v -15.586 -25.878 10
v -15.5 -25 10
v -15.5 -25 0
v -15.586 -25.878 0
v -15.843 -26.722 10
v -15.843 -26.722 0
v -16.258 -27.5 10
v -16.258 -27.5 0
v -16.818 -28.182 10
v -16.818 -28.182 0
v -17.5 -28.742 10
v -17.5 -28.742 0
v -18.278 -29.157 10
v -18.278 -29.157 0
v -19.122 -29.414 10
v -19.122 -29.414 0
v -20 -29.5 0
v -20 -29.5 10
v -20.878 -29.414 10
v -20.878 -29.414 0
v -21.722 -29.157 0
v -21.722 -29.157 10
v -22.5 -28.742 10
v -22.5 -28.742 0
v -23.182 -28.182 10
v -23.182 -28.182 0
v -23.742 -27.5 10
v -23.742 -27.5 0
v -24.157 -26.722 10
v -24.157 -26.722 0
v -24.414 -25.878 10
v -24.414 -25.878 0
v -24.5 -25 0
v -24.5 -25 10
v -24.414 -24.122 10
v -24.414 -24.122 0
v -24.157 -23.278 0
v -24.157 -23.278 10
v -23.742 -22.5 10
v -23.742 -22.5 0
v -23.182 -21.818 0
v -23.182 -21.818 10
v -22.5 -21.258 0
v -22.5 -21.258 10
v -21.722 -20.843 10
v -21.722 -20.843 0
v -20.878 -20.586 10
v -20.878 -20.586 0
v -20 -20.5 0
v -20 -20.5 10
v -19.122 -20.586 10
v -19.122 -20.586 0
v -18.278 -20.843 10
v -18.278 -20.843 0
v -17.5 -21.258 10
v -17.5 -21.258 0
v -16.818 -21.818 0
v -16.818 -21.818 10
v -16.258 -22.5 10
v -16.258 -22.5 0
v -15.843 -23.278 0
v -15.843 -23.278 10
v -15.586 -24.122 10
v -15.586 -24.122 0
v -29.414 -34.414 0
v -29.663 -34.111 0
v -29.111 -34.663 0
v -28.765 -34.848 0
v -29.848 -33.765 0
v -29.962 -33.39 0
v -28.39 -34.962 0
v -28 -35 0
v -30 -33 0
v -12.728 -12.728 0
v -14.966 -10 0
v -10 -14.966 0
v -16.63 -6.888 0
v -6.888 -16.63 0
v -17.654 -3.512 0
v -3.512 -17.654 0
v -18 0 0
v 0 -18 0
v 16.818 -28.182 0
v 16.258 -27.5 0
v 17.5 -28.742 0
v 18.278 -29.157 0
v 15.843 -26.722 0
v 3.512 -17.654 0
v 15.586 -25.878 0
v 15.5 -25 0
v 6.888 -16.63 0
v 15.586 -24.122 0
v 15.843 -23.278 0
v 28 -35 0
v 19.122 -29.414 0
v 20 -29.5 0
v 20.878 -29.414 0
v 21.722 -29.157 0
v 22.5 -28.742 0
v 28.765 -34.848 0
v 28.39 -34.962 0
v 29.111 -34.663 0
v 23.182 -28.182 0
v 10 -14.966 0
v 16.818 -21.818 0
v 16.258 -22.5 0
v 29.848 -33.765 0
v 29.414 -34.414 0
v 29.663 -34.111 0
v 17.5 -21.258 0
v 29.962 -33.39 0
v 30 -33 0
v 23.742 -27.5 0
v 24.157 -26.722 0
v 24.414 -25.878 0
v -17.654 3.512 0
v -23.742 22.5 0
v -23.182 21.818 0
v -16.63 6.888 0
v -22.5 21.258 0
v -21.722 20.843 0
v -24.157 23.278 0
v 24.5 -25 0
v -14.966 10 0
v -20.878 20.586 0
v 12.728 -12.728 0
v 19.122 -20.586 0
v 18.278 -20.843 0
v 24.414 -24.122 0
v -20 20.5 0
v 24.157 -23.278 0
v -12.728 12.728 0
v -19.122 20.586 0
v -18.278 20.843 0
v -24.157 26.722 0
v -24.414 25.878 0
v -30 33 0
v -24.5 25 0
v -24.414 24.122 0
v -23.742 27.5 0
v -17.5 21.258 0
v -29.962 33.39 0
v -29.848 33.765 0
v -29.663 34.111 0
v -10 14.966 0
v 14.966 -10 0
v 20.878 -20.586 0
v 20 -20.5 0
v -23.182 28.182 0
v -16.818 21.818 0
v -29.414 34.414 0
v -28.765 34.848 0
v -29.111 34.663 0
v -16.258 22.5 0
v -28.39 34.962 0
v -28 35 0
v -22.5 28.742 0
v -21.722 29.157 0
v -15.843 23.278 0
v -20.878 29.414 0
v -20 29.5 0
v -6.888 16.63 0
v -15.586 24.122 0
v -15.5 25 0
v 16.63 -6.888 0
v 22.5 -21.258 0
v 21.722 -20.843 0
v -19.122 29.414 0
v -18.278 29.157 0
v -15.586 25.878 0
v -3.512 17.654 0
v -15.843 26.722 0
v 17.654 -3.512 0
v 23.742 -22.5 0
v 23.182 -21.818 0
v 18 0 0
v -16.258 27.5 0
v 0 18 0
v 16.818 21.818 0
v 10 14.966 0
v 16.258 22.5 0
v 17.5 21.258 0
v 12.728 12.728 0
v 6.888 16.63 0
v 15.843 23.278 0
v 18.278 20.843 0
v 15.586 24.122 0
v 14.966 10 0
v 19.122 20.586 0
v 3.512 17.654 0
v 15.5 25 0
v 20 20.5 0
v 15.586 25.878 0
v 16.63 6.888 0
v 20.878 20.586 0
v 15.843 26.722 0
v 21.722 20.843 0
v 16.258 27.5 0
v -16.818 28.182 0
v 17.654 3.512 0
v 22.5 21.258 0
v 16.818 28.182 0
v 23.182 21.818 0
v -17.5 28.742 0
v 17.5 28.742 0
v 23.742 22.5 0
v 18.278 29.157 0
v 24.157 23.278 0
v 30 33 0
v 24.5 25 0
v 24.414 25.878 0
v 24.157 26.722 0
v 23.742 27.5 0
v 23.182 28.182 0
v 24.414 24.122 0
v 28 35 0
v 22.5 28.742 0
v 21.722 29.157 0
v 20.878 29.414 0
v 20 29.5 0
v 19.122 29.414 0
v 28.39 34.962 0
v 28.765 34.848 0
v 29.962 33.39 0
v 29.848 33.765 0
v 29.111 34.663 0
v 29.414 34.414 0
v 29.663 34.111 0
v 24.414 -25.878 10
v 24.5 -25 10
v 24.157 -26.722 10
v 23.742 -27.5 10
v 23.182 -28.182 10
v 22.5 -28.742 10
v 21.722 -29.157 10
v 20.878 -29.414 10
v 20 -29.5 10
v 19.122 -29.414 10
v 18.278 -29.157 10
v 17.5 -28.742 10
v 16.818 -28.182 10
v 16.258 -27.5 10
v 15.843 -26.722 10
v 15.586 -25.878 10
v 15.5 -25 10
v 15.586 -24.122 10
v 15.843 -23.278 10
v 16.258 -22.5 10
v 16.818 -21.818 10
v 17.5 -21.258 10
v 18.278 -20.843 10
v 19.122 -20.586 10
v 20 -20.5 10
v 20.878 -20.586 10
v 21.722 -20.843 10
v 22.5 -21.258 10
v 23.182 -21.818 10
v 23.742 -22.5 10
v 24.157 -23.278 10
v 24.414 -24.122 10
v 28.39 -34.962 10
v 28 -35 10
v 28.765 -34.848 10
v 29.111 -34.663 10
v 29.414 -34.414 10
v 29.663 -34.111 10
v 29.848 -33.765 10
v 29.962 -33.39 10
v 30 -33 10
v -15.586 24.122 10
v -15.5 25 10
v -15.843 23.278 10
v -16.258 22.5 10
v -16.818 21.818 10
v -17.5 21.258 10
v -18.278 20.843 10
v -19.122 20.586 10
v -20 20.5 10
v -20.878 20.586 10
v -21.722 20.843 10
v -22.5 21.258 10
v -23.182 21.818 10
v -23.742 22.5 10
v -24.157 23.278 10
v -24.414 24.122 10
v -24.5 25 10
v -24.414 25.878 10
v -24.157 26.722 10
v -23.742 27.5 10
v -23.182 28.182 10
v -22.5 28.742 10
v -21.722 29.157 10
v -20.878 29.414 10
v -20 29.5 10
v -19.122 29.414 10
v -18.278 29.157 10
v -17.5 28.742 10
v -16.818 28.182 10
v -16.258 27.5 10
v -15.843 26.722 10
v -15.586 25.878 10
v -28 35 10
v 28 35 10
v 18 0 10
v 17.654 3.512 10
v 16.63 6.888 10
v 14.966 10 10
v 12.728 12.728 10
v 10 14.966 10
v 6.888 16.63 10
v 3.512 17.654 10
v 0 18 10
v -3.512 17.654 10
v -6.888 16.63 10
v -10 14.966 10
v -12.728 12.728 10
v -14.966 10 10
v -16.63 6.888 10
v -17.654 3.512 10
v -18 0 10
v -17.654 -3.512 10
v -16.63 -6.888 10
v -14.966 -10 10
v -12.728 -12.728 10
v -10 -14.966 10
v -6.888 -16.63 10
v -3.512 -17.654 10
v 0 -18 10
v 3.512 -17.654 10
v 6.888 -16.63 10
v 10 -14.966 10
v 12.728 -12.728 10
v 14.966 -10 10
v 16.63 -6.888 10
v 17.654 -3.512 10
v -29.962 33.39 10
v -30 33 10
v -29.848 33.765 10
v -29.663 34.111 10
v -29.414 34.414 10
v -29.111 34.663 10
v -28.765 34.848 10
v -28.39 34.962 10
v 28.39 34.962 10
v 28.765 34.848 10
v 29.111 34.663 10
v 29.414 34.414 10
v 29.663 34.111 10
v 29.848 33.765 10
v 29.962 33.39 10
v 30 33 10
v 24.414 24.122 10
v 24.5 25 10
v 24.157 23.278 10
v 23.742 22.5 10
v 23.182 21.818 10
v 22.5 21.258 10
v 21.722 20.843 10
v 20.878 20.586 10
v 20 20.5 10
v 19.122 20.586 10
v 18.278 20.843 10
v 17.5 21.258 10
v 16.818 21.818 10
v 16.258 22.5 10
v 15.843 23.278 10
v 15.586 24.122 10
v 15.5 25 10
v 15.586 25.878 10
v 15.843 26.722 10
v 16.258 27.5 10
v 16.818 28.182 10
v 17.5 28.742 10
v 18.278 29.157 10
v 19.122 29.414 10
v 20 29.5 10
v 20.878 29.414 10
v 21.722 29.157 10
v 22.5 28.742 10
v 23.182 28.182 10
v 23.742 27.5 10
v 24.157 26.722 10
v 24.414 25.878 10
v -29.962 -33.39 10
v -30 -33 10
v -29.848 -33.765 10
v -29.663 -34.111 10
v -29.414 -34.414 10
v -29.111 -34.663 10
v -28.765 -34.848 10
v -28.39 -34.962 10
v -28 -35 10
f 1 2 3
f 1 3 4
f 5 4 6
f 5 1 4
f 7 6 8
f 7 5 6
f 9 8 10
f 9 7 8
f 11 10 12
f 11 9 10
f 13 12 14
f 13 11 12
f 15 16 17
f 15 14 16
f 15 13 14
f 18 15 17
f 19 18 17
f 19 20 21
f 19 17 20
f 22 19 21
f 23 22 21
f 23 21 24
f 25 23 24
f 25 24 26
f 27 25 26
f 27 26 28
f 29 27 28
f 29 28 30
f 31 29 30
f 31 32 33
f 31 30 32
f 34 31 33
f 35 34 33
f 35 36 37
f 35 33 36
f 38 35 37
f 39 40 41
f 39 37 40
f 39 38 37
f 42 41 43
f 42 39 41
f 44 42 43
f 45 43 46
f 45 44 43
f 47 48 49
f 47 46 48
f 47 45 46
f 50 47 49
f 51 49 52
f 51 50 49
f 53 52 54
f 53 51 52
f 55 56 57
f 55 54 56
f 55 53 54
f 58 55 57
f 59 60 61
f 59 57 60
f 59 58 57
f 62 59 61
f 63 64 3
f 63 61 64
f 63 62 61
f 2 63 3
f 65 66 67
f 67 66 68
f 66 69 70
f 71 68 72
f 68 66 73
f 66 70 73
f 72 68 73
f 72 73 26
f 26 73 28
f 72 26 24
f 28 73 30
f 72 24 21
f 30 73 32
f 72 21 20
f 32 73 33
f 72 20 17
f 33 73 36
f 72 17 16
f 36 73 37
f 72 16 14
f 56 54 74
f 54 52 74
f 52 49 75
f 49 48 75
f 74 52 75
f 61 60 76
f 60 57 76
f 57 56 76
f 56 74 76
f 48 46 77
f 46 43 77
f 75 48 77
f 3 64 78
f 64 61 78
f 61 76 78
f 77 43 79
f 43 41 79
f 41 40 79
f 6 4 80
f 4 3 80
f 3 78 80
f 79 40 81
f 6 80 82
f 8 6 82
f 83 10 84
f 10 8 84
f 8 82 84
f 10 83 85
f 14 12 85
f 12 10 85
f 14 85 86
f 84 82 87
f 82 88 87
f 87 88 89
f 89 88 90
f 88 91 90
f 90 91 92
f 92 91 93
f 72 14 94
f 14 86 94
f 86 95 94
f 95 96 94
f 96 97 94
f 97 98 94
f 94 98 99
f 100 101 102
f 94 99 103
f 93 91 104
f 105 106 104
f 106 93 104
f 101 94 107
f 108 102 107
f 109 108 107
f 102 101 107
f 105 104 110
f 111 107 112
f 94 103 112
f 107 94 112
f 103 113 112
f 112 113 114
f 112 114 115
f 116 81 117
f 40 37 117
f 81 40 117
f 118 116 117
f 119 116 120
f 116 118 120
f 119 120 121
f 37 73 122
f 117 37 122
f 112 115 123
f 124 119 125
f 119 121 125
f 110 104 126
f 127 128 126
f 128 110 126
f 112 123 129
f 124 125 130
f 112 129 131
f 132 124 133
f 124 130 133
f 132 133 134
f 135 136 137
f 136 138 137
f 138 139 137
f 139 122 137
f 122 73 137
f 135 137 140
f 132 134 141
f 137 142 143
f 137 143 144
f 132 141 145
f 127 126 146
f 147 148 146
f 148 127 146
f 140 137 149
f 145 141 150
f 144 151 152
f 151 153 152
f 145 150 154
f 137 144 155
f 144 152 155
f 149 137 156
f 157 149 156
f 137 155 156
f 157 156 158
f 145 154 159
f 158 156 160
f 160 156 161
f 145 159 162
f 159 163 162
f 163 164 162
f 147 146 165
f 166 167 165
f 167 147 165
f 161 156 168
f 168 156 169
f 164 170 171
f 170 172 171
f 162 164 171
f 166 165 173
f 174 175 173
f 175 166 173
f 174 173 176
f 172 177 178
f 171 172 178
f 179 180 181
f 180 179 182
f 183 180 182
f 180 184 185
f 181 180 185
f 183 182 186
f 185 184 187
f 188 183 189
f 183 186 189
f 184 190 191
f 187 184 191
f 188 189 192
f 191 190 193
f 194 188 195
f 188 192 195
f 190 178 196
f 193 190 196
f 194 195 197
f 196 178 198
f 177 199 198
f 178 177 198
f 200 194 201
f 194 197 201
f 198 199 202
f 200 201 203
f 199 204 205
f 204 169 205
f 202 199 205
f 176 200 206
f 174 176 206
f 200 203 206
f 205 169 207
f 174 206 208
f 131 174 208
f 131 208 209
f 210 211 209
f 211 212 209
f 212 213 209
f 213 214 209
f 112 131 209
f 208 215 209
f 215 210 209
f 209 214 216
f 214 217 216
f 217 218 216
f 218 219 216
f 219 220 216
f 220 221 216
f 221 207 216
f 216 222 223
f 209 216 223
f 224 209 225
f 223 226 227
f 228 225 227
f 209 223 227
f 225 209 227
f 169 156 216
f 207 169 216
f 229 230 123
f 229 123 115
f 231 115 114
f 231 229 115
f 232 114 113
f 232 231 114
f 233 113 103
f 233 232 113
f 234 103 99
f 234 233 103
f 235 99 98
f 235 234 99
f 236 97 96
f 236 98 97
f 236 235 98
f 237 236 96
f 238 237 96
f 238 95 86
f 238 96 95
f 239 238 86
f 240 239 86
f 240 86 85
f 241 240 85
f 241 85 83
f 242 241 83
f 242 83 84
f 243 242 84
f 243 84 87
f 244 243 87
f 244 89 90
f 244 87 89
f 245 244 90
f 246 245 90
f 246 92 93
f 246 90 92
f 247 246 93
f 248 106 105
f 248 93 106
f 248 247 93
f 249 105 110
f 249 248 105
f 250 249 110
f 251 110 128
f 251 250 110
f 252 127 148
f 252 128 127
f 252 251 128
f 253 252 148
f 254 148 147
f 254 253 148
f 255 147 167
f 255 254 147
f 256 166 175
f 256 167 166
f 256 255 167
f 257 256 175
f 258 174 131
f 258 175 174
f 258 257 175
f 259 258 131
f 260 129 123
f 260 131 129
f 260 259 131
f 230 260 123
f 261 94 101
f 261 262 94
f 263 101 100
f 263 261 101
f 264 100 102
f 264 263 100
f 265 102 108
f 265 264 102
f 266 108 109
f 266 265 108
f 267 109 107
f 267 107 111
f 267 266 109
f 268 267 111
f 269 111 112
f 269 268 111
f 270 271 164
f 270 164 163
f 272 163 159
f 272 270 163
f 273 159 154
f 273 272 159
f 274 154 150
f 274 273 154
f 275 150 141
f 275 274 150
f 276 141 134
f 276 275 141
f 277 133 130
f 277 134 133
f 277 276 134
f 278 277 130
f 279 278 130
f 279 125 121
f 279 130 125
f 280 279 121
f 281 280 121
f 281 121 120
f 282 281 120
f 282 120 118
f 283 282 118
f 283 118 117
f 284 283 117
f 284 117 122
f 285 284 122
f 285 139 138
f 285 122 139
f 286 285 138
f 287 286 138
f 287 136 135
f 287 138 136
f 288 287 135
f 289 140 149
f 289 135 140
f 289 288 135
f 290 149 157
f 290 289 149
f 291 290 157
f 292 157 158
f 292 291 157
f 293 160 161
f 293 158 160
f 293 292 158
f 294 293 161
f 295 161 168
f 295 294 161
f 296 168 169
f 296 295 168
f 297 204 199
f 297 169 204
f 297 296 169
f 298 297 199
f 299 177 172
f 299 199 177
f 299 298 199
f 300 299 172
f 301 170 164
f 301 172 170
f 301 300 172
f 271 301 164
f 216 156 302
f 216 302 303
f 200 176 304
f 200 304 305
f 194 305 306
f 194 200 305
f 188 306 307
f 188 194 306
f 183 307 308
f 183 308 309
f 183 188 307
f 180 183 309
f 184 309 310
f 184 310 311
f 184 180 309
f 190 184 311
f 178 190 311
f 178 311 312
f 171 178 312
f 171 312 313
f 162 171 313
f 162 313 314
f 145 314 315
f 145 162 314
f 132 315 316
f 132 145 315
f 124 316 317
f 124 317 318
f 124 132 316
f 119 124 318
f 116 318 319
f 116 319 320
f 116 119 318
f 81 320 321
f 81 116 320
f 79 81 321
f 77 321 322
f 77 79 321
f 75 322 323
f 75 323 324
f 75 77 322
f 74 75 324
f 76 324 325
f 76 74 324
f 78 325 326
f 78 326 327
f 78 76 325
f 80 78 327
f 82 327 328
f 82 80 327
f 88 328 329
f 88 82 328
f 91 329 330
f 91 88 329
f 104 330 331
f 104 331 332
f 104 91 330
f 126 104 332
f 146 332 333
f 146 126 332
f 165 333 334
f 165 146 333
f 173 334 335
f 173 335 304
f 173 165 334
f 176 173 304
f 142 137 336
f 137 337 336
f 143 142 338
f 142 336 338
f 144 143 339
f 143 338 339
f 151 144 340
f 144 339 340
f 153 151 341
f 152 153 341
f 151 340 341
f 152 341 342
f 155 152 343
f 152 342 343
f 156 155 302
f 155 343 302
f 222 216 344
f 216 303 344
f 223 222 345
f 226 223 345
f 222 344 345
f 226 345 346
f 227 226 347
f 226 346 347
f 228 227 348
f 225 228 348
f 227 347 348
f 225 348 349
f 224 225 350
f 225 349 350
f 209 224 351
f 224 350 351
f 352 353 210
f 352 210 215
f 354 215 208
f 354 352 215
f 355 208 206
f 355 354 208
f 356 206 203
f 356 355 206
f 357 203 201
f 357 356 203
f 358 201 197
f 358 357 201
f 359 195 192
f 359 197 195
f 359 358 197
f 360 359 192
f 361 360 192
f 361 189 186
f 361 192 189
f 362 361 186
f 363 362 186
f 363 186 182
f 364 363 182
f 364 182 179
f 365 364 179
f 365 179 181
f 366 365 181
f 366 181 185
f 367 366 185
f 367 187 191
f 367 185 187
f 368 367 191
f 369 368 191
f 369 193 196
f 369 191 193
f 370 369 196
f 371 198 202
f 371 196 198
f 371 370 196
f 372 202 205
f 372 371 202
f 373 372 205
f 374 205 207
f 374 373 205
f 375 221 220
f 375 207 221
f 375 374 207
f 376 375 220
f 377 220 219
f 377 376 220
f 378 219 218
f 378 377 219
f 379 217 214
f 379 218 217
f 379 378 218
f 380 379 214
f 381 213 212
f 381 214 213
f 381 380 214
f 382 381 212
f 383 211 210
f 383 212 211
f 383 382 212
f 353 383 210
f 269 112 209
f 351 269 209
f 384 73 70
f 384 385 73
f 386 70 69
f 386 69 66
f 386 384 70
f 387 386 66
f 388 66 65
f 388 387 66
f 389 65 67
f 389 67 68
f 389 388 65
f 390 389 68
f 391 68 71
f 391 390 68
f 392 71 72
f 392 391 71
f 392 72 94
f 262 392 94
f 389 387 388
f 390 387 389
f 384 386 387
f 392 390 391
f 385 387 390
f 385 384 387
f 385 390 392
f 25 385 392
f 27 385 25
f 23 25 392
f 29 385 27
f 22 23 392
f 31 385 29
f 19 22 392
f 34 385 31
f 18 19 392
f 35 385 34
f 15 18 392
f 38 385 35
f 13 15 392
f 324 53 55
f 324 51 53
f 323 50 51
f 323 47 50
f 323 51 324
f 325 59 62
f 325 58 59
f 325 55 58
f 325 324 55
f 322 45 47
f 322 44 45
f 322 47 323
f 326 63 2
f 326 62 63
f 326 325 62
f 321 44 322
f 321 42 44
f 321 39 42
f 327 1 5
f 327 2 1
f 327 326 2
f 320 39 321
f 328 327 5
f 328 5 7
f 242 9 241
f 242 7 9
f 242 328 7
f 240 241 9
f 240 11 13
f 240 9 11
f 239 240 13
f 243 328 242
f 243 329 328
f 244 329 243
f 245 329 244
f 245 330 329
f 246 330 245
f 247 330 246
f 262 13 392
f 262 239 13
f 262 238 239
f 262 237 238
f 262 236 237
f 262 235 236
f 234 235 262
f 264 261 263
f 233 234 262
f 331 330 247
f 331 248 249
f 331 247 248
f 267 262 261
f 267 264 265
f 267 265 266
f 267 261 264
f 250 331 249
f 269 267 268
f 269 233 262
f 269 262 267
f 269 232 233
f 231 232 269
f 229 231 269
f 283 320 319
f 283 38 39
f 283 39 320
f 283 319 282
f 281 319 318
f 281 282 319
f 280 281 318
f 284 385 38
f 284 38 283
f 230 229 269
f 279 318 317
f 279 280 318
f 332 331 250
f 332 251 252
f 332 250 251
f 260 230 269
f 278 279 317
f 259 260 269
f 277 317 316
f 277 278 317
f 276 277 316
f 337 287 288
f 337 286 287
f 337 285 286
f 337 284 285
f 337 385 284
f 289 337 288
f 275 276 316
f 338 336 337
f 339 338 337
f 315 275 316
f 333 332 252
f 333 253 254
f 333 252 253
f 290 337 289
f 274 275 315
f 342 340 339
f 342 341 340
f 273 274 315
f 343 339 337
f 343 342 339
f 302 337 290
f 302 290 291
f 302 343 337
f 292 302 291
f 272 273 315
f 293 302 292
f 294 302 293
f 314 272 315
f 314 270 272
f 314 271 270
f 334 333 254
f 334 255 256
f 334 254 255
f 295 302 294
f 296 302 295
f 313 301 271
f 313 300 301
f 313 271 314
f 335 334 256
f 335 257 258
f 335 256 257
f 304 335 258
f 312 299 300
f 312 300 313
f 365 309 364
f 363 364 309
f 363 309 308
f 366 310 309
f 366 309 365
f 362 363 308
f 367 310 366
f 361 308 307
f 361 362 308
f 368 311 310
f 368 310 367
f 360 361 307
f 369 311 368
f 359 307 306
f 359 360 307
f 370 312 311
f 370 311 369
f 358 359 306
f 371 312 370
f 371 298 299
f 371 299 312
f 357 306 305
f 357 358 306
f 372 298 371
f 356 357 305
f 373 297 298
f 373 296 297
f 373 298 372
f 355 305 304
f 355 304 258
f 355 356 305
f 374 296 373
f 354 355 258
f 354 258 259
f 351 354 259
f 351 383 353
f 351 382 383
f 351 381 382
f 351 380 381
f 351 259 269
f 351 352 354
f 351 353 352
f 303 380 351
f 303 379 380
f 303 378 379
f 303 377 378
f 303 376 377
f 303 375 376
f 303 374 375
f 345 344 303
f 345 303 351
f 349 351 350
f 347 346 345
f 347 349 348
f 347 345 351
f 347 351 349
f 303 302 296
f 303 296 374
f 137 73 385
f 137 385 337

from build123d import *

# Parameters (mm, degrees)
SKETCH1_W           = 60
SKETCH1_H           = 70
SKETCH1_R           = 18
BOSS_EXTRUDE1_DEPTH = 10
FILLET1_R           = 2
SKETCH3_R           = 4.5
CUT_EXTRUDE2_DEPTH  = 100


with BuildPart() as part:
    # Sketch1 → Boss-Extrude1 (new body)
    with BuildSketch(Plane.XY):
        Rectangle(SKETCH1_W, SKETCH1_H)
        Circle(SKETCH1_R, mode=Mode.SUBTRACT)
    extrude(amount=BOSS_EXTRUDE1_DEPTH)

    # Fillet1
    fillet1_edges = [part.edges().sort_by_distance(p)[0] for p in [
        (-30, -35, 5),
        (-30, 35, 5),
        (30, 35, 5),
        (30, -35, 5),
    ]]
    fillet(fillet1_edges, radius=FILLET1_R)

    # Sketch3 → Cut-Extrude2 (cut)
    with BuildSketch(Plane(origin=(-387.472155748, 43.575337974, 11), x_dir=(-1, 0, 0), z_dir=(0, 0, -1))):
        with Locations(Location((-407.472155748, -68.575337974, 0), (0, 0, 180))):
            Circle(SKETCH3_R)
        with Locations(Location((-367.472155748, -68.575337974, 0), (0, 0, 180))):
            Circle(SKETCH3_R)
        with Locations(Location((-367.472155748, -18.575337974, 0), (0, 0, 180))):
            Circle(SKETCH3_R)
        with Locations(Location((-407.472155748, -18.575337974, 0), (0, 0, 180))):
            Circle(SKETCH3_R)
    extrude(amount=CUT_EXTRUDE2_DEPTH, mode=Mode.SUBTRACT)


solid = part.part
